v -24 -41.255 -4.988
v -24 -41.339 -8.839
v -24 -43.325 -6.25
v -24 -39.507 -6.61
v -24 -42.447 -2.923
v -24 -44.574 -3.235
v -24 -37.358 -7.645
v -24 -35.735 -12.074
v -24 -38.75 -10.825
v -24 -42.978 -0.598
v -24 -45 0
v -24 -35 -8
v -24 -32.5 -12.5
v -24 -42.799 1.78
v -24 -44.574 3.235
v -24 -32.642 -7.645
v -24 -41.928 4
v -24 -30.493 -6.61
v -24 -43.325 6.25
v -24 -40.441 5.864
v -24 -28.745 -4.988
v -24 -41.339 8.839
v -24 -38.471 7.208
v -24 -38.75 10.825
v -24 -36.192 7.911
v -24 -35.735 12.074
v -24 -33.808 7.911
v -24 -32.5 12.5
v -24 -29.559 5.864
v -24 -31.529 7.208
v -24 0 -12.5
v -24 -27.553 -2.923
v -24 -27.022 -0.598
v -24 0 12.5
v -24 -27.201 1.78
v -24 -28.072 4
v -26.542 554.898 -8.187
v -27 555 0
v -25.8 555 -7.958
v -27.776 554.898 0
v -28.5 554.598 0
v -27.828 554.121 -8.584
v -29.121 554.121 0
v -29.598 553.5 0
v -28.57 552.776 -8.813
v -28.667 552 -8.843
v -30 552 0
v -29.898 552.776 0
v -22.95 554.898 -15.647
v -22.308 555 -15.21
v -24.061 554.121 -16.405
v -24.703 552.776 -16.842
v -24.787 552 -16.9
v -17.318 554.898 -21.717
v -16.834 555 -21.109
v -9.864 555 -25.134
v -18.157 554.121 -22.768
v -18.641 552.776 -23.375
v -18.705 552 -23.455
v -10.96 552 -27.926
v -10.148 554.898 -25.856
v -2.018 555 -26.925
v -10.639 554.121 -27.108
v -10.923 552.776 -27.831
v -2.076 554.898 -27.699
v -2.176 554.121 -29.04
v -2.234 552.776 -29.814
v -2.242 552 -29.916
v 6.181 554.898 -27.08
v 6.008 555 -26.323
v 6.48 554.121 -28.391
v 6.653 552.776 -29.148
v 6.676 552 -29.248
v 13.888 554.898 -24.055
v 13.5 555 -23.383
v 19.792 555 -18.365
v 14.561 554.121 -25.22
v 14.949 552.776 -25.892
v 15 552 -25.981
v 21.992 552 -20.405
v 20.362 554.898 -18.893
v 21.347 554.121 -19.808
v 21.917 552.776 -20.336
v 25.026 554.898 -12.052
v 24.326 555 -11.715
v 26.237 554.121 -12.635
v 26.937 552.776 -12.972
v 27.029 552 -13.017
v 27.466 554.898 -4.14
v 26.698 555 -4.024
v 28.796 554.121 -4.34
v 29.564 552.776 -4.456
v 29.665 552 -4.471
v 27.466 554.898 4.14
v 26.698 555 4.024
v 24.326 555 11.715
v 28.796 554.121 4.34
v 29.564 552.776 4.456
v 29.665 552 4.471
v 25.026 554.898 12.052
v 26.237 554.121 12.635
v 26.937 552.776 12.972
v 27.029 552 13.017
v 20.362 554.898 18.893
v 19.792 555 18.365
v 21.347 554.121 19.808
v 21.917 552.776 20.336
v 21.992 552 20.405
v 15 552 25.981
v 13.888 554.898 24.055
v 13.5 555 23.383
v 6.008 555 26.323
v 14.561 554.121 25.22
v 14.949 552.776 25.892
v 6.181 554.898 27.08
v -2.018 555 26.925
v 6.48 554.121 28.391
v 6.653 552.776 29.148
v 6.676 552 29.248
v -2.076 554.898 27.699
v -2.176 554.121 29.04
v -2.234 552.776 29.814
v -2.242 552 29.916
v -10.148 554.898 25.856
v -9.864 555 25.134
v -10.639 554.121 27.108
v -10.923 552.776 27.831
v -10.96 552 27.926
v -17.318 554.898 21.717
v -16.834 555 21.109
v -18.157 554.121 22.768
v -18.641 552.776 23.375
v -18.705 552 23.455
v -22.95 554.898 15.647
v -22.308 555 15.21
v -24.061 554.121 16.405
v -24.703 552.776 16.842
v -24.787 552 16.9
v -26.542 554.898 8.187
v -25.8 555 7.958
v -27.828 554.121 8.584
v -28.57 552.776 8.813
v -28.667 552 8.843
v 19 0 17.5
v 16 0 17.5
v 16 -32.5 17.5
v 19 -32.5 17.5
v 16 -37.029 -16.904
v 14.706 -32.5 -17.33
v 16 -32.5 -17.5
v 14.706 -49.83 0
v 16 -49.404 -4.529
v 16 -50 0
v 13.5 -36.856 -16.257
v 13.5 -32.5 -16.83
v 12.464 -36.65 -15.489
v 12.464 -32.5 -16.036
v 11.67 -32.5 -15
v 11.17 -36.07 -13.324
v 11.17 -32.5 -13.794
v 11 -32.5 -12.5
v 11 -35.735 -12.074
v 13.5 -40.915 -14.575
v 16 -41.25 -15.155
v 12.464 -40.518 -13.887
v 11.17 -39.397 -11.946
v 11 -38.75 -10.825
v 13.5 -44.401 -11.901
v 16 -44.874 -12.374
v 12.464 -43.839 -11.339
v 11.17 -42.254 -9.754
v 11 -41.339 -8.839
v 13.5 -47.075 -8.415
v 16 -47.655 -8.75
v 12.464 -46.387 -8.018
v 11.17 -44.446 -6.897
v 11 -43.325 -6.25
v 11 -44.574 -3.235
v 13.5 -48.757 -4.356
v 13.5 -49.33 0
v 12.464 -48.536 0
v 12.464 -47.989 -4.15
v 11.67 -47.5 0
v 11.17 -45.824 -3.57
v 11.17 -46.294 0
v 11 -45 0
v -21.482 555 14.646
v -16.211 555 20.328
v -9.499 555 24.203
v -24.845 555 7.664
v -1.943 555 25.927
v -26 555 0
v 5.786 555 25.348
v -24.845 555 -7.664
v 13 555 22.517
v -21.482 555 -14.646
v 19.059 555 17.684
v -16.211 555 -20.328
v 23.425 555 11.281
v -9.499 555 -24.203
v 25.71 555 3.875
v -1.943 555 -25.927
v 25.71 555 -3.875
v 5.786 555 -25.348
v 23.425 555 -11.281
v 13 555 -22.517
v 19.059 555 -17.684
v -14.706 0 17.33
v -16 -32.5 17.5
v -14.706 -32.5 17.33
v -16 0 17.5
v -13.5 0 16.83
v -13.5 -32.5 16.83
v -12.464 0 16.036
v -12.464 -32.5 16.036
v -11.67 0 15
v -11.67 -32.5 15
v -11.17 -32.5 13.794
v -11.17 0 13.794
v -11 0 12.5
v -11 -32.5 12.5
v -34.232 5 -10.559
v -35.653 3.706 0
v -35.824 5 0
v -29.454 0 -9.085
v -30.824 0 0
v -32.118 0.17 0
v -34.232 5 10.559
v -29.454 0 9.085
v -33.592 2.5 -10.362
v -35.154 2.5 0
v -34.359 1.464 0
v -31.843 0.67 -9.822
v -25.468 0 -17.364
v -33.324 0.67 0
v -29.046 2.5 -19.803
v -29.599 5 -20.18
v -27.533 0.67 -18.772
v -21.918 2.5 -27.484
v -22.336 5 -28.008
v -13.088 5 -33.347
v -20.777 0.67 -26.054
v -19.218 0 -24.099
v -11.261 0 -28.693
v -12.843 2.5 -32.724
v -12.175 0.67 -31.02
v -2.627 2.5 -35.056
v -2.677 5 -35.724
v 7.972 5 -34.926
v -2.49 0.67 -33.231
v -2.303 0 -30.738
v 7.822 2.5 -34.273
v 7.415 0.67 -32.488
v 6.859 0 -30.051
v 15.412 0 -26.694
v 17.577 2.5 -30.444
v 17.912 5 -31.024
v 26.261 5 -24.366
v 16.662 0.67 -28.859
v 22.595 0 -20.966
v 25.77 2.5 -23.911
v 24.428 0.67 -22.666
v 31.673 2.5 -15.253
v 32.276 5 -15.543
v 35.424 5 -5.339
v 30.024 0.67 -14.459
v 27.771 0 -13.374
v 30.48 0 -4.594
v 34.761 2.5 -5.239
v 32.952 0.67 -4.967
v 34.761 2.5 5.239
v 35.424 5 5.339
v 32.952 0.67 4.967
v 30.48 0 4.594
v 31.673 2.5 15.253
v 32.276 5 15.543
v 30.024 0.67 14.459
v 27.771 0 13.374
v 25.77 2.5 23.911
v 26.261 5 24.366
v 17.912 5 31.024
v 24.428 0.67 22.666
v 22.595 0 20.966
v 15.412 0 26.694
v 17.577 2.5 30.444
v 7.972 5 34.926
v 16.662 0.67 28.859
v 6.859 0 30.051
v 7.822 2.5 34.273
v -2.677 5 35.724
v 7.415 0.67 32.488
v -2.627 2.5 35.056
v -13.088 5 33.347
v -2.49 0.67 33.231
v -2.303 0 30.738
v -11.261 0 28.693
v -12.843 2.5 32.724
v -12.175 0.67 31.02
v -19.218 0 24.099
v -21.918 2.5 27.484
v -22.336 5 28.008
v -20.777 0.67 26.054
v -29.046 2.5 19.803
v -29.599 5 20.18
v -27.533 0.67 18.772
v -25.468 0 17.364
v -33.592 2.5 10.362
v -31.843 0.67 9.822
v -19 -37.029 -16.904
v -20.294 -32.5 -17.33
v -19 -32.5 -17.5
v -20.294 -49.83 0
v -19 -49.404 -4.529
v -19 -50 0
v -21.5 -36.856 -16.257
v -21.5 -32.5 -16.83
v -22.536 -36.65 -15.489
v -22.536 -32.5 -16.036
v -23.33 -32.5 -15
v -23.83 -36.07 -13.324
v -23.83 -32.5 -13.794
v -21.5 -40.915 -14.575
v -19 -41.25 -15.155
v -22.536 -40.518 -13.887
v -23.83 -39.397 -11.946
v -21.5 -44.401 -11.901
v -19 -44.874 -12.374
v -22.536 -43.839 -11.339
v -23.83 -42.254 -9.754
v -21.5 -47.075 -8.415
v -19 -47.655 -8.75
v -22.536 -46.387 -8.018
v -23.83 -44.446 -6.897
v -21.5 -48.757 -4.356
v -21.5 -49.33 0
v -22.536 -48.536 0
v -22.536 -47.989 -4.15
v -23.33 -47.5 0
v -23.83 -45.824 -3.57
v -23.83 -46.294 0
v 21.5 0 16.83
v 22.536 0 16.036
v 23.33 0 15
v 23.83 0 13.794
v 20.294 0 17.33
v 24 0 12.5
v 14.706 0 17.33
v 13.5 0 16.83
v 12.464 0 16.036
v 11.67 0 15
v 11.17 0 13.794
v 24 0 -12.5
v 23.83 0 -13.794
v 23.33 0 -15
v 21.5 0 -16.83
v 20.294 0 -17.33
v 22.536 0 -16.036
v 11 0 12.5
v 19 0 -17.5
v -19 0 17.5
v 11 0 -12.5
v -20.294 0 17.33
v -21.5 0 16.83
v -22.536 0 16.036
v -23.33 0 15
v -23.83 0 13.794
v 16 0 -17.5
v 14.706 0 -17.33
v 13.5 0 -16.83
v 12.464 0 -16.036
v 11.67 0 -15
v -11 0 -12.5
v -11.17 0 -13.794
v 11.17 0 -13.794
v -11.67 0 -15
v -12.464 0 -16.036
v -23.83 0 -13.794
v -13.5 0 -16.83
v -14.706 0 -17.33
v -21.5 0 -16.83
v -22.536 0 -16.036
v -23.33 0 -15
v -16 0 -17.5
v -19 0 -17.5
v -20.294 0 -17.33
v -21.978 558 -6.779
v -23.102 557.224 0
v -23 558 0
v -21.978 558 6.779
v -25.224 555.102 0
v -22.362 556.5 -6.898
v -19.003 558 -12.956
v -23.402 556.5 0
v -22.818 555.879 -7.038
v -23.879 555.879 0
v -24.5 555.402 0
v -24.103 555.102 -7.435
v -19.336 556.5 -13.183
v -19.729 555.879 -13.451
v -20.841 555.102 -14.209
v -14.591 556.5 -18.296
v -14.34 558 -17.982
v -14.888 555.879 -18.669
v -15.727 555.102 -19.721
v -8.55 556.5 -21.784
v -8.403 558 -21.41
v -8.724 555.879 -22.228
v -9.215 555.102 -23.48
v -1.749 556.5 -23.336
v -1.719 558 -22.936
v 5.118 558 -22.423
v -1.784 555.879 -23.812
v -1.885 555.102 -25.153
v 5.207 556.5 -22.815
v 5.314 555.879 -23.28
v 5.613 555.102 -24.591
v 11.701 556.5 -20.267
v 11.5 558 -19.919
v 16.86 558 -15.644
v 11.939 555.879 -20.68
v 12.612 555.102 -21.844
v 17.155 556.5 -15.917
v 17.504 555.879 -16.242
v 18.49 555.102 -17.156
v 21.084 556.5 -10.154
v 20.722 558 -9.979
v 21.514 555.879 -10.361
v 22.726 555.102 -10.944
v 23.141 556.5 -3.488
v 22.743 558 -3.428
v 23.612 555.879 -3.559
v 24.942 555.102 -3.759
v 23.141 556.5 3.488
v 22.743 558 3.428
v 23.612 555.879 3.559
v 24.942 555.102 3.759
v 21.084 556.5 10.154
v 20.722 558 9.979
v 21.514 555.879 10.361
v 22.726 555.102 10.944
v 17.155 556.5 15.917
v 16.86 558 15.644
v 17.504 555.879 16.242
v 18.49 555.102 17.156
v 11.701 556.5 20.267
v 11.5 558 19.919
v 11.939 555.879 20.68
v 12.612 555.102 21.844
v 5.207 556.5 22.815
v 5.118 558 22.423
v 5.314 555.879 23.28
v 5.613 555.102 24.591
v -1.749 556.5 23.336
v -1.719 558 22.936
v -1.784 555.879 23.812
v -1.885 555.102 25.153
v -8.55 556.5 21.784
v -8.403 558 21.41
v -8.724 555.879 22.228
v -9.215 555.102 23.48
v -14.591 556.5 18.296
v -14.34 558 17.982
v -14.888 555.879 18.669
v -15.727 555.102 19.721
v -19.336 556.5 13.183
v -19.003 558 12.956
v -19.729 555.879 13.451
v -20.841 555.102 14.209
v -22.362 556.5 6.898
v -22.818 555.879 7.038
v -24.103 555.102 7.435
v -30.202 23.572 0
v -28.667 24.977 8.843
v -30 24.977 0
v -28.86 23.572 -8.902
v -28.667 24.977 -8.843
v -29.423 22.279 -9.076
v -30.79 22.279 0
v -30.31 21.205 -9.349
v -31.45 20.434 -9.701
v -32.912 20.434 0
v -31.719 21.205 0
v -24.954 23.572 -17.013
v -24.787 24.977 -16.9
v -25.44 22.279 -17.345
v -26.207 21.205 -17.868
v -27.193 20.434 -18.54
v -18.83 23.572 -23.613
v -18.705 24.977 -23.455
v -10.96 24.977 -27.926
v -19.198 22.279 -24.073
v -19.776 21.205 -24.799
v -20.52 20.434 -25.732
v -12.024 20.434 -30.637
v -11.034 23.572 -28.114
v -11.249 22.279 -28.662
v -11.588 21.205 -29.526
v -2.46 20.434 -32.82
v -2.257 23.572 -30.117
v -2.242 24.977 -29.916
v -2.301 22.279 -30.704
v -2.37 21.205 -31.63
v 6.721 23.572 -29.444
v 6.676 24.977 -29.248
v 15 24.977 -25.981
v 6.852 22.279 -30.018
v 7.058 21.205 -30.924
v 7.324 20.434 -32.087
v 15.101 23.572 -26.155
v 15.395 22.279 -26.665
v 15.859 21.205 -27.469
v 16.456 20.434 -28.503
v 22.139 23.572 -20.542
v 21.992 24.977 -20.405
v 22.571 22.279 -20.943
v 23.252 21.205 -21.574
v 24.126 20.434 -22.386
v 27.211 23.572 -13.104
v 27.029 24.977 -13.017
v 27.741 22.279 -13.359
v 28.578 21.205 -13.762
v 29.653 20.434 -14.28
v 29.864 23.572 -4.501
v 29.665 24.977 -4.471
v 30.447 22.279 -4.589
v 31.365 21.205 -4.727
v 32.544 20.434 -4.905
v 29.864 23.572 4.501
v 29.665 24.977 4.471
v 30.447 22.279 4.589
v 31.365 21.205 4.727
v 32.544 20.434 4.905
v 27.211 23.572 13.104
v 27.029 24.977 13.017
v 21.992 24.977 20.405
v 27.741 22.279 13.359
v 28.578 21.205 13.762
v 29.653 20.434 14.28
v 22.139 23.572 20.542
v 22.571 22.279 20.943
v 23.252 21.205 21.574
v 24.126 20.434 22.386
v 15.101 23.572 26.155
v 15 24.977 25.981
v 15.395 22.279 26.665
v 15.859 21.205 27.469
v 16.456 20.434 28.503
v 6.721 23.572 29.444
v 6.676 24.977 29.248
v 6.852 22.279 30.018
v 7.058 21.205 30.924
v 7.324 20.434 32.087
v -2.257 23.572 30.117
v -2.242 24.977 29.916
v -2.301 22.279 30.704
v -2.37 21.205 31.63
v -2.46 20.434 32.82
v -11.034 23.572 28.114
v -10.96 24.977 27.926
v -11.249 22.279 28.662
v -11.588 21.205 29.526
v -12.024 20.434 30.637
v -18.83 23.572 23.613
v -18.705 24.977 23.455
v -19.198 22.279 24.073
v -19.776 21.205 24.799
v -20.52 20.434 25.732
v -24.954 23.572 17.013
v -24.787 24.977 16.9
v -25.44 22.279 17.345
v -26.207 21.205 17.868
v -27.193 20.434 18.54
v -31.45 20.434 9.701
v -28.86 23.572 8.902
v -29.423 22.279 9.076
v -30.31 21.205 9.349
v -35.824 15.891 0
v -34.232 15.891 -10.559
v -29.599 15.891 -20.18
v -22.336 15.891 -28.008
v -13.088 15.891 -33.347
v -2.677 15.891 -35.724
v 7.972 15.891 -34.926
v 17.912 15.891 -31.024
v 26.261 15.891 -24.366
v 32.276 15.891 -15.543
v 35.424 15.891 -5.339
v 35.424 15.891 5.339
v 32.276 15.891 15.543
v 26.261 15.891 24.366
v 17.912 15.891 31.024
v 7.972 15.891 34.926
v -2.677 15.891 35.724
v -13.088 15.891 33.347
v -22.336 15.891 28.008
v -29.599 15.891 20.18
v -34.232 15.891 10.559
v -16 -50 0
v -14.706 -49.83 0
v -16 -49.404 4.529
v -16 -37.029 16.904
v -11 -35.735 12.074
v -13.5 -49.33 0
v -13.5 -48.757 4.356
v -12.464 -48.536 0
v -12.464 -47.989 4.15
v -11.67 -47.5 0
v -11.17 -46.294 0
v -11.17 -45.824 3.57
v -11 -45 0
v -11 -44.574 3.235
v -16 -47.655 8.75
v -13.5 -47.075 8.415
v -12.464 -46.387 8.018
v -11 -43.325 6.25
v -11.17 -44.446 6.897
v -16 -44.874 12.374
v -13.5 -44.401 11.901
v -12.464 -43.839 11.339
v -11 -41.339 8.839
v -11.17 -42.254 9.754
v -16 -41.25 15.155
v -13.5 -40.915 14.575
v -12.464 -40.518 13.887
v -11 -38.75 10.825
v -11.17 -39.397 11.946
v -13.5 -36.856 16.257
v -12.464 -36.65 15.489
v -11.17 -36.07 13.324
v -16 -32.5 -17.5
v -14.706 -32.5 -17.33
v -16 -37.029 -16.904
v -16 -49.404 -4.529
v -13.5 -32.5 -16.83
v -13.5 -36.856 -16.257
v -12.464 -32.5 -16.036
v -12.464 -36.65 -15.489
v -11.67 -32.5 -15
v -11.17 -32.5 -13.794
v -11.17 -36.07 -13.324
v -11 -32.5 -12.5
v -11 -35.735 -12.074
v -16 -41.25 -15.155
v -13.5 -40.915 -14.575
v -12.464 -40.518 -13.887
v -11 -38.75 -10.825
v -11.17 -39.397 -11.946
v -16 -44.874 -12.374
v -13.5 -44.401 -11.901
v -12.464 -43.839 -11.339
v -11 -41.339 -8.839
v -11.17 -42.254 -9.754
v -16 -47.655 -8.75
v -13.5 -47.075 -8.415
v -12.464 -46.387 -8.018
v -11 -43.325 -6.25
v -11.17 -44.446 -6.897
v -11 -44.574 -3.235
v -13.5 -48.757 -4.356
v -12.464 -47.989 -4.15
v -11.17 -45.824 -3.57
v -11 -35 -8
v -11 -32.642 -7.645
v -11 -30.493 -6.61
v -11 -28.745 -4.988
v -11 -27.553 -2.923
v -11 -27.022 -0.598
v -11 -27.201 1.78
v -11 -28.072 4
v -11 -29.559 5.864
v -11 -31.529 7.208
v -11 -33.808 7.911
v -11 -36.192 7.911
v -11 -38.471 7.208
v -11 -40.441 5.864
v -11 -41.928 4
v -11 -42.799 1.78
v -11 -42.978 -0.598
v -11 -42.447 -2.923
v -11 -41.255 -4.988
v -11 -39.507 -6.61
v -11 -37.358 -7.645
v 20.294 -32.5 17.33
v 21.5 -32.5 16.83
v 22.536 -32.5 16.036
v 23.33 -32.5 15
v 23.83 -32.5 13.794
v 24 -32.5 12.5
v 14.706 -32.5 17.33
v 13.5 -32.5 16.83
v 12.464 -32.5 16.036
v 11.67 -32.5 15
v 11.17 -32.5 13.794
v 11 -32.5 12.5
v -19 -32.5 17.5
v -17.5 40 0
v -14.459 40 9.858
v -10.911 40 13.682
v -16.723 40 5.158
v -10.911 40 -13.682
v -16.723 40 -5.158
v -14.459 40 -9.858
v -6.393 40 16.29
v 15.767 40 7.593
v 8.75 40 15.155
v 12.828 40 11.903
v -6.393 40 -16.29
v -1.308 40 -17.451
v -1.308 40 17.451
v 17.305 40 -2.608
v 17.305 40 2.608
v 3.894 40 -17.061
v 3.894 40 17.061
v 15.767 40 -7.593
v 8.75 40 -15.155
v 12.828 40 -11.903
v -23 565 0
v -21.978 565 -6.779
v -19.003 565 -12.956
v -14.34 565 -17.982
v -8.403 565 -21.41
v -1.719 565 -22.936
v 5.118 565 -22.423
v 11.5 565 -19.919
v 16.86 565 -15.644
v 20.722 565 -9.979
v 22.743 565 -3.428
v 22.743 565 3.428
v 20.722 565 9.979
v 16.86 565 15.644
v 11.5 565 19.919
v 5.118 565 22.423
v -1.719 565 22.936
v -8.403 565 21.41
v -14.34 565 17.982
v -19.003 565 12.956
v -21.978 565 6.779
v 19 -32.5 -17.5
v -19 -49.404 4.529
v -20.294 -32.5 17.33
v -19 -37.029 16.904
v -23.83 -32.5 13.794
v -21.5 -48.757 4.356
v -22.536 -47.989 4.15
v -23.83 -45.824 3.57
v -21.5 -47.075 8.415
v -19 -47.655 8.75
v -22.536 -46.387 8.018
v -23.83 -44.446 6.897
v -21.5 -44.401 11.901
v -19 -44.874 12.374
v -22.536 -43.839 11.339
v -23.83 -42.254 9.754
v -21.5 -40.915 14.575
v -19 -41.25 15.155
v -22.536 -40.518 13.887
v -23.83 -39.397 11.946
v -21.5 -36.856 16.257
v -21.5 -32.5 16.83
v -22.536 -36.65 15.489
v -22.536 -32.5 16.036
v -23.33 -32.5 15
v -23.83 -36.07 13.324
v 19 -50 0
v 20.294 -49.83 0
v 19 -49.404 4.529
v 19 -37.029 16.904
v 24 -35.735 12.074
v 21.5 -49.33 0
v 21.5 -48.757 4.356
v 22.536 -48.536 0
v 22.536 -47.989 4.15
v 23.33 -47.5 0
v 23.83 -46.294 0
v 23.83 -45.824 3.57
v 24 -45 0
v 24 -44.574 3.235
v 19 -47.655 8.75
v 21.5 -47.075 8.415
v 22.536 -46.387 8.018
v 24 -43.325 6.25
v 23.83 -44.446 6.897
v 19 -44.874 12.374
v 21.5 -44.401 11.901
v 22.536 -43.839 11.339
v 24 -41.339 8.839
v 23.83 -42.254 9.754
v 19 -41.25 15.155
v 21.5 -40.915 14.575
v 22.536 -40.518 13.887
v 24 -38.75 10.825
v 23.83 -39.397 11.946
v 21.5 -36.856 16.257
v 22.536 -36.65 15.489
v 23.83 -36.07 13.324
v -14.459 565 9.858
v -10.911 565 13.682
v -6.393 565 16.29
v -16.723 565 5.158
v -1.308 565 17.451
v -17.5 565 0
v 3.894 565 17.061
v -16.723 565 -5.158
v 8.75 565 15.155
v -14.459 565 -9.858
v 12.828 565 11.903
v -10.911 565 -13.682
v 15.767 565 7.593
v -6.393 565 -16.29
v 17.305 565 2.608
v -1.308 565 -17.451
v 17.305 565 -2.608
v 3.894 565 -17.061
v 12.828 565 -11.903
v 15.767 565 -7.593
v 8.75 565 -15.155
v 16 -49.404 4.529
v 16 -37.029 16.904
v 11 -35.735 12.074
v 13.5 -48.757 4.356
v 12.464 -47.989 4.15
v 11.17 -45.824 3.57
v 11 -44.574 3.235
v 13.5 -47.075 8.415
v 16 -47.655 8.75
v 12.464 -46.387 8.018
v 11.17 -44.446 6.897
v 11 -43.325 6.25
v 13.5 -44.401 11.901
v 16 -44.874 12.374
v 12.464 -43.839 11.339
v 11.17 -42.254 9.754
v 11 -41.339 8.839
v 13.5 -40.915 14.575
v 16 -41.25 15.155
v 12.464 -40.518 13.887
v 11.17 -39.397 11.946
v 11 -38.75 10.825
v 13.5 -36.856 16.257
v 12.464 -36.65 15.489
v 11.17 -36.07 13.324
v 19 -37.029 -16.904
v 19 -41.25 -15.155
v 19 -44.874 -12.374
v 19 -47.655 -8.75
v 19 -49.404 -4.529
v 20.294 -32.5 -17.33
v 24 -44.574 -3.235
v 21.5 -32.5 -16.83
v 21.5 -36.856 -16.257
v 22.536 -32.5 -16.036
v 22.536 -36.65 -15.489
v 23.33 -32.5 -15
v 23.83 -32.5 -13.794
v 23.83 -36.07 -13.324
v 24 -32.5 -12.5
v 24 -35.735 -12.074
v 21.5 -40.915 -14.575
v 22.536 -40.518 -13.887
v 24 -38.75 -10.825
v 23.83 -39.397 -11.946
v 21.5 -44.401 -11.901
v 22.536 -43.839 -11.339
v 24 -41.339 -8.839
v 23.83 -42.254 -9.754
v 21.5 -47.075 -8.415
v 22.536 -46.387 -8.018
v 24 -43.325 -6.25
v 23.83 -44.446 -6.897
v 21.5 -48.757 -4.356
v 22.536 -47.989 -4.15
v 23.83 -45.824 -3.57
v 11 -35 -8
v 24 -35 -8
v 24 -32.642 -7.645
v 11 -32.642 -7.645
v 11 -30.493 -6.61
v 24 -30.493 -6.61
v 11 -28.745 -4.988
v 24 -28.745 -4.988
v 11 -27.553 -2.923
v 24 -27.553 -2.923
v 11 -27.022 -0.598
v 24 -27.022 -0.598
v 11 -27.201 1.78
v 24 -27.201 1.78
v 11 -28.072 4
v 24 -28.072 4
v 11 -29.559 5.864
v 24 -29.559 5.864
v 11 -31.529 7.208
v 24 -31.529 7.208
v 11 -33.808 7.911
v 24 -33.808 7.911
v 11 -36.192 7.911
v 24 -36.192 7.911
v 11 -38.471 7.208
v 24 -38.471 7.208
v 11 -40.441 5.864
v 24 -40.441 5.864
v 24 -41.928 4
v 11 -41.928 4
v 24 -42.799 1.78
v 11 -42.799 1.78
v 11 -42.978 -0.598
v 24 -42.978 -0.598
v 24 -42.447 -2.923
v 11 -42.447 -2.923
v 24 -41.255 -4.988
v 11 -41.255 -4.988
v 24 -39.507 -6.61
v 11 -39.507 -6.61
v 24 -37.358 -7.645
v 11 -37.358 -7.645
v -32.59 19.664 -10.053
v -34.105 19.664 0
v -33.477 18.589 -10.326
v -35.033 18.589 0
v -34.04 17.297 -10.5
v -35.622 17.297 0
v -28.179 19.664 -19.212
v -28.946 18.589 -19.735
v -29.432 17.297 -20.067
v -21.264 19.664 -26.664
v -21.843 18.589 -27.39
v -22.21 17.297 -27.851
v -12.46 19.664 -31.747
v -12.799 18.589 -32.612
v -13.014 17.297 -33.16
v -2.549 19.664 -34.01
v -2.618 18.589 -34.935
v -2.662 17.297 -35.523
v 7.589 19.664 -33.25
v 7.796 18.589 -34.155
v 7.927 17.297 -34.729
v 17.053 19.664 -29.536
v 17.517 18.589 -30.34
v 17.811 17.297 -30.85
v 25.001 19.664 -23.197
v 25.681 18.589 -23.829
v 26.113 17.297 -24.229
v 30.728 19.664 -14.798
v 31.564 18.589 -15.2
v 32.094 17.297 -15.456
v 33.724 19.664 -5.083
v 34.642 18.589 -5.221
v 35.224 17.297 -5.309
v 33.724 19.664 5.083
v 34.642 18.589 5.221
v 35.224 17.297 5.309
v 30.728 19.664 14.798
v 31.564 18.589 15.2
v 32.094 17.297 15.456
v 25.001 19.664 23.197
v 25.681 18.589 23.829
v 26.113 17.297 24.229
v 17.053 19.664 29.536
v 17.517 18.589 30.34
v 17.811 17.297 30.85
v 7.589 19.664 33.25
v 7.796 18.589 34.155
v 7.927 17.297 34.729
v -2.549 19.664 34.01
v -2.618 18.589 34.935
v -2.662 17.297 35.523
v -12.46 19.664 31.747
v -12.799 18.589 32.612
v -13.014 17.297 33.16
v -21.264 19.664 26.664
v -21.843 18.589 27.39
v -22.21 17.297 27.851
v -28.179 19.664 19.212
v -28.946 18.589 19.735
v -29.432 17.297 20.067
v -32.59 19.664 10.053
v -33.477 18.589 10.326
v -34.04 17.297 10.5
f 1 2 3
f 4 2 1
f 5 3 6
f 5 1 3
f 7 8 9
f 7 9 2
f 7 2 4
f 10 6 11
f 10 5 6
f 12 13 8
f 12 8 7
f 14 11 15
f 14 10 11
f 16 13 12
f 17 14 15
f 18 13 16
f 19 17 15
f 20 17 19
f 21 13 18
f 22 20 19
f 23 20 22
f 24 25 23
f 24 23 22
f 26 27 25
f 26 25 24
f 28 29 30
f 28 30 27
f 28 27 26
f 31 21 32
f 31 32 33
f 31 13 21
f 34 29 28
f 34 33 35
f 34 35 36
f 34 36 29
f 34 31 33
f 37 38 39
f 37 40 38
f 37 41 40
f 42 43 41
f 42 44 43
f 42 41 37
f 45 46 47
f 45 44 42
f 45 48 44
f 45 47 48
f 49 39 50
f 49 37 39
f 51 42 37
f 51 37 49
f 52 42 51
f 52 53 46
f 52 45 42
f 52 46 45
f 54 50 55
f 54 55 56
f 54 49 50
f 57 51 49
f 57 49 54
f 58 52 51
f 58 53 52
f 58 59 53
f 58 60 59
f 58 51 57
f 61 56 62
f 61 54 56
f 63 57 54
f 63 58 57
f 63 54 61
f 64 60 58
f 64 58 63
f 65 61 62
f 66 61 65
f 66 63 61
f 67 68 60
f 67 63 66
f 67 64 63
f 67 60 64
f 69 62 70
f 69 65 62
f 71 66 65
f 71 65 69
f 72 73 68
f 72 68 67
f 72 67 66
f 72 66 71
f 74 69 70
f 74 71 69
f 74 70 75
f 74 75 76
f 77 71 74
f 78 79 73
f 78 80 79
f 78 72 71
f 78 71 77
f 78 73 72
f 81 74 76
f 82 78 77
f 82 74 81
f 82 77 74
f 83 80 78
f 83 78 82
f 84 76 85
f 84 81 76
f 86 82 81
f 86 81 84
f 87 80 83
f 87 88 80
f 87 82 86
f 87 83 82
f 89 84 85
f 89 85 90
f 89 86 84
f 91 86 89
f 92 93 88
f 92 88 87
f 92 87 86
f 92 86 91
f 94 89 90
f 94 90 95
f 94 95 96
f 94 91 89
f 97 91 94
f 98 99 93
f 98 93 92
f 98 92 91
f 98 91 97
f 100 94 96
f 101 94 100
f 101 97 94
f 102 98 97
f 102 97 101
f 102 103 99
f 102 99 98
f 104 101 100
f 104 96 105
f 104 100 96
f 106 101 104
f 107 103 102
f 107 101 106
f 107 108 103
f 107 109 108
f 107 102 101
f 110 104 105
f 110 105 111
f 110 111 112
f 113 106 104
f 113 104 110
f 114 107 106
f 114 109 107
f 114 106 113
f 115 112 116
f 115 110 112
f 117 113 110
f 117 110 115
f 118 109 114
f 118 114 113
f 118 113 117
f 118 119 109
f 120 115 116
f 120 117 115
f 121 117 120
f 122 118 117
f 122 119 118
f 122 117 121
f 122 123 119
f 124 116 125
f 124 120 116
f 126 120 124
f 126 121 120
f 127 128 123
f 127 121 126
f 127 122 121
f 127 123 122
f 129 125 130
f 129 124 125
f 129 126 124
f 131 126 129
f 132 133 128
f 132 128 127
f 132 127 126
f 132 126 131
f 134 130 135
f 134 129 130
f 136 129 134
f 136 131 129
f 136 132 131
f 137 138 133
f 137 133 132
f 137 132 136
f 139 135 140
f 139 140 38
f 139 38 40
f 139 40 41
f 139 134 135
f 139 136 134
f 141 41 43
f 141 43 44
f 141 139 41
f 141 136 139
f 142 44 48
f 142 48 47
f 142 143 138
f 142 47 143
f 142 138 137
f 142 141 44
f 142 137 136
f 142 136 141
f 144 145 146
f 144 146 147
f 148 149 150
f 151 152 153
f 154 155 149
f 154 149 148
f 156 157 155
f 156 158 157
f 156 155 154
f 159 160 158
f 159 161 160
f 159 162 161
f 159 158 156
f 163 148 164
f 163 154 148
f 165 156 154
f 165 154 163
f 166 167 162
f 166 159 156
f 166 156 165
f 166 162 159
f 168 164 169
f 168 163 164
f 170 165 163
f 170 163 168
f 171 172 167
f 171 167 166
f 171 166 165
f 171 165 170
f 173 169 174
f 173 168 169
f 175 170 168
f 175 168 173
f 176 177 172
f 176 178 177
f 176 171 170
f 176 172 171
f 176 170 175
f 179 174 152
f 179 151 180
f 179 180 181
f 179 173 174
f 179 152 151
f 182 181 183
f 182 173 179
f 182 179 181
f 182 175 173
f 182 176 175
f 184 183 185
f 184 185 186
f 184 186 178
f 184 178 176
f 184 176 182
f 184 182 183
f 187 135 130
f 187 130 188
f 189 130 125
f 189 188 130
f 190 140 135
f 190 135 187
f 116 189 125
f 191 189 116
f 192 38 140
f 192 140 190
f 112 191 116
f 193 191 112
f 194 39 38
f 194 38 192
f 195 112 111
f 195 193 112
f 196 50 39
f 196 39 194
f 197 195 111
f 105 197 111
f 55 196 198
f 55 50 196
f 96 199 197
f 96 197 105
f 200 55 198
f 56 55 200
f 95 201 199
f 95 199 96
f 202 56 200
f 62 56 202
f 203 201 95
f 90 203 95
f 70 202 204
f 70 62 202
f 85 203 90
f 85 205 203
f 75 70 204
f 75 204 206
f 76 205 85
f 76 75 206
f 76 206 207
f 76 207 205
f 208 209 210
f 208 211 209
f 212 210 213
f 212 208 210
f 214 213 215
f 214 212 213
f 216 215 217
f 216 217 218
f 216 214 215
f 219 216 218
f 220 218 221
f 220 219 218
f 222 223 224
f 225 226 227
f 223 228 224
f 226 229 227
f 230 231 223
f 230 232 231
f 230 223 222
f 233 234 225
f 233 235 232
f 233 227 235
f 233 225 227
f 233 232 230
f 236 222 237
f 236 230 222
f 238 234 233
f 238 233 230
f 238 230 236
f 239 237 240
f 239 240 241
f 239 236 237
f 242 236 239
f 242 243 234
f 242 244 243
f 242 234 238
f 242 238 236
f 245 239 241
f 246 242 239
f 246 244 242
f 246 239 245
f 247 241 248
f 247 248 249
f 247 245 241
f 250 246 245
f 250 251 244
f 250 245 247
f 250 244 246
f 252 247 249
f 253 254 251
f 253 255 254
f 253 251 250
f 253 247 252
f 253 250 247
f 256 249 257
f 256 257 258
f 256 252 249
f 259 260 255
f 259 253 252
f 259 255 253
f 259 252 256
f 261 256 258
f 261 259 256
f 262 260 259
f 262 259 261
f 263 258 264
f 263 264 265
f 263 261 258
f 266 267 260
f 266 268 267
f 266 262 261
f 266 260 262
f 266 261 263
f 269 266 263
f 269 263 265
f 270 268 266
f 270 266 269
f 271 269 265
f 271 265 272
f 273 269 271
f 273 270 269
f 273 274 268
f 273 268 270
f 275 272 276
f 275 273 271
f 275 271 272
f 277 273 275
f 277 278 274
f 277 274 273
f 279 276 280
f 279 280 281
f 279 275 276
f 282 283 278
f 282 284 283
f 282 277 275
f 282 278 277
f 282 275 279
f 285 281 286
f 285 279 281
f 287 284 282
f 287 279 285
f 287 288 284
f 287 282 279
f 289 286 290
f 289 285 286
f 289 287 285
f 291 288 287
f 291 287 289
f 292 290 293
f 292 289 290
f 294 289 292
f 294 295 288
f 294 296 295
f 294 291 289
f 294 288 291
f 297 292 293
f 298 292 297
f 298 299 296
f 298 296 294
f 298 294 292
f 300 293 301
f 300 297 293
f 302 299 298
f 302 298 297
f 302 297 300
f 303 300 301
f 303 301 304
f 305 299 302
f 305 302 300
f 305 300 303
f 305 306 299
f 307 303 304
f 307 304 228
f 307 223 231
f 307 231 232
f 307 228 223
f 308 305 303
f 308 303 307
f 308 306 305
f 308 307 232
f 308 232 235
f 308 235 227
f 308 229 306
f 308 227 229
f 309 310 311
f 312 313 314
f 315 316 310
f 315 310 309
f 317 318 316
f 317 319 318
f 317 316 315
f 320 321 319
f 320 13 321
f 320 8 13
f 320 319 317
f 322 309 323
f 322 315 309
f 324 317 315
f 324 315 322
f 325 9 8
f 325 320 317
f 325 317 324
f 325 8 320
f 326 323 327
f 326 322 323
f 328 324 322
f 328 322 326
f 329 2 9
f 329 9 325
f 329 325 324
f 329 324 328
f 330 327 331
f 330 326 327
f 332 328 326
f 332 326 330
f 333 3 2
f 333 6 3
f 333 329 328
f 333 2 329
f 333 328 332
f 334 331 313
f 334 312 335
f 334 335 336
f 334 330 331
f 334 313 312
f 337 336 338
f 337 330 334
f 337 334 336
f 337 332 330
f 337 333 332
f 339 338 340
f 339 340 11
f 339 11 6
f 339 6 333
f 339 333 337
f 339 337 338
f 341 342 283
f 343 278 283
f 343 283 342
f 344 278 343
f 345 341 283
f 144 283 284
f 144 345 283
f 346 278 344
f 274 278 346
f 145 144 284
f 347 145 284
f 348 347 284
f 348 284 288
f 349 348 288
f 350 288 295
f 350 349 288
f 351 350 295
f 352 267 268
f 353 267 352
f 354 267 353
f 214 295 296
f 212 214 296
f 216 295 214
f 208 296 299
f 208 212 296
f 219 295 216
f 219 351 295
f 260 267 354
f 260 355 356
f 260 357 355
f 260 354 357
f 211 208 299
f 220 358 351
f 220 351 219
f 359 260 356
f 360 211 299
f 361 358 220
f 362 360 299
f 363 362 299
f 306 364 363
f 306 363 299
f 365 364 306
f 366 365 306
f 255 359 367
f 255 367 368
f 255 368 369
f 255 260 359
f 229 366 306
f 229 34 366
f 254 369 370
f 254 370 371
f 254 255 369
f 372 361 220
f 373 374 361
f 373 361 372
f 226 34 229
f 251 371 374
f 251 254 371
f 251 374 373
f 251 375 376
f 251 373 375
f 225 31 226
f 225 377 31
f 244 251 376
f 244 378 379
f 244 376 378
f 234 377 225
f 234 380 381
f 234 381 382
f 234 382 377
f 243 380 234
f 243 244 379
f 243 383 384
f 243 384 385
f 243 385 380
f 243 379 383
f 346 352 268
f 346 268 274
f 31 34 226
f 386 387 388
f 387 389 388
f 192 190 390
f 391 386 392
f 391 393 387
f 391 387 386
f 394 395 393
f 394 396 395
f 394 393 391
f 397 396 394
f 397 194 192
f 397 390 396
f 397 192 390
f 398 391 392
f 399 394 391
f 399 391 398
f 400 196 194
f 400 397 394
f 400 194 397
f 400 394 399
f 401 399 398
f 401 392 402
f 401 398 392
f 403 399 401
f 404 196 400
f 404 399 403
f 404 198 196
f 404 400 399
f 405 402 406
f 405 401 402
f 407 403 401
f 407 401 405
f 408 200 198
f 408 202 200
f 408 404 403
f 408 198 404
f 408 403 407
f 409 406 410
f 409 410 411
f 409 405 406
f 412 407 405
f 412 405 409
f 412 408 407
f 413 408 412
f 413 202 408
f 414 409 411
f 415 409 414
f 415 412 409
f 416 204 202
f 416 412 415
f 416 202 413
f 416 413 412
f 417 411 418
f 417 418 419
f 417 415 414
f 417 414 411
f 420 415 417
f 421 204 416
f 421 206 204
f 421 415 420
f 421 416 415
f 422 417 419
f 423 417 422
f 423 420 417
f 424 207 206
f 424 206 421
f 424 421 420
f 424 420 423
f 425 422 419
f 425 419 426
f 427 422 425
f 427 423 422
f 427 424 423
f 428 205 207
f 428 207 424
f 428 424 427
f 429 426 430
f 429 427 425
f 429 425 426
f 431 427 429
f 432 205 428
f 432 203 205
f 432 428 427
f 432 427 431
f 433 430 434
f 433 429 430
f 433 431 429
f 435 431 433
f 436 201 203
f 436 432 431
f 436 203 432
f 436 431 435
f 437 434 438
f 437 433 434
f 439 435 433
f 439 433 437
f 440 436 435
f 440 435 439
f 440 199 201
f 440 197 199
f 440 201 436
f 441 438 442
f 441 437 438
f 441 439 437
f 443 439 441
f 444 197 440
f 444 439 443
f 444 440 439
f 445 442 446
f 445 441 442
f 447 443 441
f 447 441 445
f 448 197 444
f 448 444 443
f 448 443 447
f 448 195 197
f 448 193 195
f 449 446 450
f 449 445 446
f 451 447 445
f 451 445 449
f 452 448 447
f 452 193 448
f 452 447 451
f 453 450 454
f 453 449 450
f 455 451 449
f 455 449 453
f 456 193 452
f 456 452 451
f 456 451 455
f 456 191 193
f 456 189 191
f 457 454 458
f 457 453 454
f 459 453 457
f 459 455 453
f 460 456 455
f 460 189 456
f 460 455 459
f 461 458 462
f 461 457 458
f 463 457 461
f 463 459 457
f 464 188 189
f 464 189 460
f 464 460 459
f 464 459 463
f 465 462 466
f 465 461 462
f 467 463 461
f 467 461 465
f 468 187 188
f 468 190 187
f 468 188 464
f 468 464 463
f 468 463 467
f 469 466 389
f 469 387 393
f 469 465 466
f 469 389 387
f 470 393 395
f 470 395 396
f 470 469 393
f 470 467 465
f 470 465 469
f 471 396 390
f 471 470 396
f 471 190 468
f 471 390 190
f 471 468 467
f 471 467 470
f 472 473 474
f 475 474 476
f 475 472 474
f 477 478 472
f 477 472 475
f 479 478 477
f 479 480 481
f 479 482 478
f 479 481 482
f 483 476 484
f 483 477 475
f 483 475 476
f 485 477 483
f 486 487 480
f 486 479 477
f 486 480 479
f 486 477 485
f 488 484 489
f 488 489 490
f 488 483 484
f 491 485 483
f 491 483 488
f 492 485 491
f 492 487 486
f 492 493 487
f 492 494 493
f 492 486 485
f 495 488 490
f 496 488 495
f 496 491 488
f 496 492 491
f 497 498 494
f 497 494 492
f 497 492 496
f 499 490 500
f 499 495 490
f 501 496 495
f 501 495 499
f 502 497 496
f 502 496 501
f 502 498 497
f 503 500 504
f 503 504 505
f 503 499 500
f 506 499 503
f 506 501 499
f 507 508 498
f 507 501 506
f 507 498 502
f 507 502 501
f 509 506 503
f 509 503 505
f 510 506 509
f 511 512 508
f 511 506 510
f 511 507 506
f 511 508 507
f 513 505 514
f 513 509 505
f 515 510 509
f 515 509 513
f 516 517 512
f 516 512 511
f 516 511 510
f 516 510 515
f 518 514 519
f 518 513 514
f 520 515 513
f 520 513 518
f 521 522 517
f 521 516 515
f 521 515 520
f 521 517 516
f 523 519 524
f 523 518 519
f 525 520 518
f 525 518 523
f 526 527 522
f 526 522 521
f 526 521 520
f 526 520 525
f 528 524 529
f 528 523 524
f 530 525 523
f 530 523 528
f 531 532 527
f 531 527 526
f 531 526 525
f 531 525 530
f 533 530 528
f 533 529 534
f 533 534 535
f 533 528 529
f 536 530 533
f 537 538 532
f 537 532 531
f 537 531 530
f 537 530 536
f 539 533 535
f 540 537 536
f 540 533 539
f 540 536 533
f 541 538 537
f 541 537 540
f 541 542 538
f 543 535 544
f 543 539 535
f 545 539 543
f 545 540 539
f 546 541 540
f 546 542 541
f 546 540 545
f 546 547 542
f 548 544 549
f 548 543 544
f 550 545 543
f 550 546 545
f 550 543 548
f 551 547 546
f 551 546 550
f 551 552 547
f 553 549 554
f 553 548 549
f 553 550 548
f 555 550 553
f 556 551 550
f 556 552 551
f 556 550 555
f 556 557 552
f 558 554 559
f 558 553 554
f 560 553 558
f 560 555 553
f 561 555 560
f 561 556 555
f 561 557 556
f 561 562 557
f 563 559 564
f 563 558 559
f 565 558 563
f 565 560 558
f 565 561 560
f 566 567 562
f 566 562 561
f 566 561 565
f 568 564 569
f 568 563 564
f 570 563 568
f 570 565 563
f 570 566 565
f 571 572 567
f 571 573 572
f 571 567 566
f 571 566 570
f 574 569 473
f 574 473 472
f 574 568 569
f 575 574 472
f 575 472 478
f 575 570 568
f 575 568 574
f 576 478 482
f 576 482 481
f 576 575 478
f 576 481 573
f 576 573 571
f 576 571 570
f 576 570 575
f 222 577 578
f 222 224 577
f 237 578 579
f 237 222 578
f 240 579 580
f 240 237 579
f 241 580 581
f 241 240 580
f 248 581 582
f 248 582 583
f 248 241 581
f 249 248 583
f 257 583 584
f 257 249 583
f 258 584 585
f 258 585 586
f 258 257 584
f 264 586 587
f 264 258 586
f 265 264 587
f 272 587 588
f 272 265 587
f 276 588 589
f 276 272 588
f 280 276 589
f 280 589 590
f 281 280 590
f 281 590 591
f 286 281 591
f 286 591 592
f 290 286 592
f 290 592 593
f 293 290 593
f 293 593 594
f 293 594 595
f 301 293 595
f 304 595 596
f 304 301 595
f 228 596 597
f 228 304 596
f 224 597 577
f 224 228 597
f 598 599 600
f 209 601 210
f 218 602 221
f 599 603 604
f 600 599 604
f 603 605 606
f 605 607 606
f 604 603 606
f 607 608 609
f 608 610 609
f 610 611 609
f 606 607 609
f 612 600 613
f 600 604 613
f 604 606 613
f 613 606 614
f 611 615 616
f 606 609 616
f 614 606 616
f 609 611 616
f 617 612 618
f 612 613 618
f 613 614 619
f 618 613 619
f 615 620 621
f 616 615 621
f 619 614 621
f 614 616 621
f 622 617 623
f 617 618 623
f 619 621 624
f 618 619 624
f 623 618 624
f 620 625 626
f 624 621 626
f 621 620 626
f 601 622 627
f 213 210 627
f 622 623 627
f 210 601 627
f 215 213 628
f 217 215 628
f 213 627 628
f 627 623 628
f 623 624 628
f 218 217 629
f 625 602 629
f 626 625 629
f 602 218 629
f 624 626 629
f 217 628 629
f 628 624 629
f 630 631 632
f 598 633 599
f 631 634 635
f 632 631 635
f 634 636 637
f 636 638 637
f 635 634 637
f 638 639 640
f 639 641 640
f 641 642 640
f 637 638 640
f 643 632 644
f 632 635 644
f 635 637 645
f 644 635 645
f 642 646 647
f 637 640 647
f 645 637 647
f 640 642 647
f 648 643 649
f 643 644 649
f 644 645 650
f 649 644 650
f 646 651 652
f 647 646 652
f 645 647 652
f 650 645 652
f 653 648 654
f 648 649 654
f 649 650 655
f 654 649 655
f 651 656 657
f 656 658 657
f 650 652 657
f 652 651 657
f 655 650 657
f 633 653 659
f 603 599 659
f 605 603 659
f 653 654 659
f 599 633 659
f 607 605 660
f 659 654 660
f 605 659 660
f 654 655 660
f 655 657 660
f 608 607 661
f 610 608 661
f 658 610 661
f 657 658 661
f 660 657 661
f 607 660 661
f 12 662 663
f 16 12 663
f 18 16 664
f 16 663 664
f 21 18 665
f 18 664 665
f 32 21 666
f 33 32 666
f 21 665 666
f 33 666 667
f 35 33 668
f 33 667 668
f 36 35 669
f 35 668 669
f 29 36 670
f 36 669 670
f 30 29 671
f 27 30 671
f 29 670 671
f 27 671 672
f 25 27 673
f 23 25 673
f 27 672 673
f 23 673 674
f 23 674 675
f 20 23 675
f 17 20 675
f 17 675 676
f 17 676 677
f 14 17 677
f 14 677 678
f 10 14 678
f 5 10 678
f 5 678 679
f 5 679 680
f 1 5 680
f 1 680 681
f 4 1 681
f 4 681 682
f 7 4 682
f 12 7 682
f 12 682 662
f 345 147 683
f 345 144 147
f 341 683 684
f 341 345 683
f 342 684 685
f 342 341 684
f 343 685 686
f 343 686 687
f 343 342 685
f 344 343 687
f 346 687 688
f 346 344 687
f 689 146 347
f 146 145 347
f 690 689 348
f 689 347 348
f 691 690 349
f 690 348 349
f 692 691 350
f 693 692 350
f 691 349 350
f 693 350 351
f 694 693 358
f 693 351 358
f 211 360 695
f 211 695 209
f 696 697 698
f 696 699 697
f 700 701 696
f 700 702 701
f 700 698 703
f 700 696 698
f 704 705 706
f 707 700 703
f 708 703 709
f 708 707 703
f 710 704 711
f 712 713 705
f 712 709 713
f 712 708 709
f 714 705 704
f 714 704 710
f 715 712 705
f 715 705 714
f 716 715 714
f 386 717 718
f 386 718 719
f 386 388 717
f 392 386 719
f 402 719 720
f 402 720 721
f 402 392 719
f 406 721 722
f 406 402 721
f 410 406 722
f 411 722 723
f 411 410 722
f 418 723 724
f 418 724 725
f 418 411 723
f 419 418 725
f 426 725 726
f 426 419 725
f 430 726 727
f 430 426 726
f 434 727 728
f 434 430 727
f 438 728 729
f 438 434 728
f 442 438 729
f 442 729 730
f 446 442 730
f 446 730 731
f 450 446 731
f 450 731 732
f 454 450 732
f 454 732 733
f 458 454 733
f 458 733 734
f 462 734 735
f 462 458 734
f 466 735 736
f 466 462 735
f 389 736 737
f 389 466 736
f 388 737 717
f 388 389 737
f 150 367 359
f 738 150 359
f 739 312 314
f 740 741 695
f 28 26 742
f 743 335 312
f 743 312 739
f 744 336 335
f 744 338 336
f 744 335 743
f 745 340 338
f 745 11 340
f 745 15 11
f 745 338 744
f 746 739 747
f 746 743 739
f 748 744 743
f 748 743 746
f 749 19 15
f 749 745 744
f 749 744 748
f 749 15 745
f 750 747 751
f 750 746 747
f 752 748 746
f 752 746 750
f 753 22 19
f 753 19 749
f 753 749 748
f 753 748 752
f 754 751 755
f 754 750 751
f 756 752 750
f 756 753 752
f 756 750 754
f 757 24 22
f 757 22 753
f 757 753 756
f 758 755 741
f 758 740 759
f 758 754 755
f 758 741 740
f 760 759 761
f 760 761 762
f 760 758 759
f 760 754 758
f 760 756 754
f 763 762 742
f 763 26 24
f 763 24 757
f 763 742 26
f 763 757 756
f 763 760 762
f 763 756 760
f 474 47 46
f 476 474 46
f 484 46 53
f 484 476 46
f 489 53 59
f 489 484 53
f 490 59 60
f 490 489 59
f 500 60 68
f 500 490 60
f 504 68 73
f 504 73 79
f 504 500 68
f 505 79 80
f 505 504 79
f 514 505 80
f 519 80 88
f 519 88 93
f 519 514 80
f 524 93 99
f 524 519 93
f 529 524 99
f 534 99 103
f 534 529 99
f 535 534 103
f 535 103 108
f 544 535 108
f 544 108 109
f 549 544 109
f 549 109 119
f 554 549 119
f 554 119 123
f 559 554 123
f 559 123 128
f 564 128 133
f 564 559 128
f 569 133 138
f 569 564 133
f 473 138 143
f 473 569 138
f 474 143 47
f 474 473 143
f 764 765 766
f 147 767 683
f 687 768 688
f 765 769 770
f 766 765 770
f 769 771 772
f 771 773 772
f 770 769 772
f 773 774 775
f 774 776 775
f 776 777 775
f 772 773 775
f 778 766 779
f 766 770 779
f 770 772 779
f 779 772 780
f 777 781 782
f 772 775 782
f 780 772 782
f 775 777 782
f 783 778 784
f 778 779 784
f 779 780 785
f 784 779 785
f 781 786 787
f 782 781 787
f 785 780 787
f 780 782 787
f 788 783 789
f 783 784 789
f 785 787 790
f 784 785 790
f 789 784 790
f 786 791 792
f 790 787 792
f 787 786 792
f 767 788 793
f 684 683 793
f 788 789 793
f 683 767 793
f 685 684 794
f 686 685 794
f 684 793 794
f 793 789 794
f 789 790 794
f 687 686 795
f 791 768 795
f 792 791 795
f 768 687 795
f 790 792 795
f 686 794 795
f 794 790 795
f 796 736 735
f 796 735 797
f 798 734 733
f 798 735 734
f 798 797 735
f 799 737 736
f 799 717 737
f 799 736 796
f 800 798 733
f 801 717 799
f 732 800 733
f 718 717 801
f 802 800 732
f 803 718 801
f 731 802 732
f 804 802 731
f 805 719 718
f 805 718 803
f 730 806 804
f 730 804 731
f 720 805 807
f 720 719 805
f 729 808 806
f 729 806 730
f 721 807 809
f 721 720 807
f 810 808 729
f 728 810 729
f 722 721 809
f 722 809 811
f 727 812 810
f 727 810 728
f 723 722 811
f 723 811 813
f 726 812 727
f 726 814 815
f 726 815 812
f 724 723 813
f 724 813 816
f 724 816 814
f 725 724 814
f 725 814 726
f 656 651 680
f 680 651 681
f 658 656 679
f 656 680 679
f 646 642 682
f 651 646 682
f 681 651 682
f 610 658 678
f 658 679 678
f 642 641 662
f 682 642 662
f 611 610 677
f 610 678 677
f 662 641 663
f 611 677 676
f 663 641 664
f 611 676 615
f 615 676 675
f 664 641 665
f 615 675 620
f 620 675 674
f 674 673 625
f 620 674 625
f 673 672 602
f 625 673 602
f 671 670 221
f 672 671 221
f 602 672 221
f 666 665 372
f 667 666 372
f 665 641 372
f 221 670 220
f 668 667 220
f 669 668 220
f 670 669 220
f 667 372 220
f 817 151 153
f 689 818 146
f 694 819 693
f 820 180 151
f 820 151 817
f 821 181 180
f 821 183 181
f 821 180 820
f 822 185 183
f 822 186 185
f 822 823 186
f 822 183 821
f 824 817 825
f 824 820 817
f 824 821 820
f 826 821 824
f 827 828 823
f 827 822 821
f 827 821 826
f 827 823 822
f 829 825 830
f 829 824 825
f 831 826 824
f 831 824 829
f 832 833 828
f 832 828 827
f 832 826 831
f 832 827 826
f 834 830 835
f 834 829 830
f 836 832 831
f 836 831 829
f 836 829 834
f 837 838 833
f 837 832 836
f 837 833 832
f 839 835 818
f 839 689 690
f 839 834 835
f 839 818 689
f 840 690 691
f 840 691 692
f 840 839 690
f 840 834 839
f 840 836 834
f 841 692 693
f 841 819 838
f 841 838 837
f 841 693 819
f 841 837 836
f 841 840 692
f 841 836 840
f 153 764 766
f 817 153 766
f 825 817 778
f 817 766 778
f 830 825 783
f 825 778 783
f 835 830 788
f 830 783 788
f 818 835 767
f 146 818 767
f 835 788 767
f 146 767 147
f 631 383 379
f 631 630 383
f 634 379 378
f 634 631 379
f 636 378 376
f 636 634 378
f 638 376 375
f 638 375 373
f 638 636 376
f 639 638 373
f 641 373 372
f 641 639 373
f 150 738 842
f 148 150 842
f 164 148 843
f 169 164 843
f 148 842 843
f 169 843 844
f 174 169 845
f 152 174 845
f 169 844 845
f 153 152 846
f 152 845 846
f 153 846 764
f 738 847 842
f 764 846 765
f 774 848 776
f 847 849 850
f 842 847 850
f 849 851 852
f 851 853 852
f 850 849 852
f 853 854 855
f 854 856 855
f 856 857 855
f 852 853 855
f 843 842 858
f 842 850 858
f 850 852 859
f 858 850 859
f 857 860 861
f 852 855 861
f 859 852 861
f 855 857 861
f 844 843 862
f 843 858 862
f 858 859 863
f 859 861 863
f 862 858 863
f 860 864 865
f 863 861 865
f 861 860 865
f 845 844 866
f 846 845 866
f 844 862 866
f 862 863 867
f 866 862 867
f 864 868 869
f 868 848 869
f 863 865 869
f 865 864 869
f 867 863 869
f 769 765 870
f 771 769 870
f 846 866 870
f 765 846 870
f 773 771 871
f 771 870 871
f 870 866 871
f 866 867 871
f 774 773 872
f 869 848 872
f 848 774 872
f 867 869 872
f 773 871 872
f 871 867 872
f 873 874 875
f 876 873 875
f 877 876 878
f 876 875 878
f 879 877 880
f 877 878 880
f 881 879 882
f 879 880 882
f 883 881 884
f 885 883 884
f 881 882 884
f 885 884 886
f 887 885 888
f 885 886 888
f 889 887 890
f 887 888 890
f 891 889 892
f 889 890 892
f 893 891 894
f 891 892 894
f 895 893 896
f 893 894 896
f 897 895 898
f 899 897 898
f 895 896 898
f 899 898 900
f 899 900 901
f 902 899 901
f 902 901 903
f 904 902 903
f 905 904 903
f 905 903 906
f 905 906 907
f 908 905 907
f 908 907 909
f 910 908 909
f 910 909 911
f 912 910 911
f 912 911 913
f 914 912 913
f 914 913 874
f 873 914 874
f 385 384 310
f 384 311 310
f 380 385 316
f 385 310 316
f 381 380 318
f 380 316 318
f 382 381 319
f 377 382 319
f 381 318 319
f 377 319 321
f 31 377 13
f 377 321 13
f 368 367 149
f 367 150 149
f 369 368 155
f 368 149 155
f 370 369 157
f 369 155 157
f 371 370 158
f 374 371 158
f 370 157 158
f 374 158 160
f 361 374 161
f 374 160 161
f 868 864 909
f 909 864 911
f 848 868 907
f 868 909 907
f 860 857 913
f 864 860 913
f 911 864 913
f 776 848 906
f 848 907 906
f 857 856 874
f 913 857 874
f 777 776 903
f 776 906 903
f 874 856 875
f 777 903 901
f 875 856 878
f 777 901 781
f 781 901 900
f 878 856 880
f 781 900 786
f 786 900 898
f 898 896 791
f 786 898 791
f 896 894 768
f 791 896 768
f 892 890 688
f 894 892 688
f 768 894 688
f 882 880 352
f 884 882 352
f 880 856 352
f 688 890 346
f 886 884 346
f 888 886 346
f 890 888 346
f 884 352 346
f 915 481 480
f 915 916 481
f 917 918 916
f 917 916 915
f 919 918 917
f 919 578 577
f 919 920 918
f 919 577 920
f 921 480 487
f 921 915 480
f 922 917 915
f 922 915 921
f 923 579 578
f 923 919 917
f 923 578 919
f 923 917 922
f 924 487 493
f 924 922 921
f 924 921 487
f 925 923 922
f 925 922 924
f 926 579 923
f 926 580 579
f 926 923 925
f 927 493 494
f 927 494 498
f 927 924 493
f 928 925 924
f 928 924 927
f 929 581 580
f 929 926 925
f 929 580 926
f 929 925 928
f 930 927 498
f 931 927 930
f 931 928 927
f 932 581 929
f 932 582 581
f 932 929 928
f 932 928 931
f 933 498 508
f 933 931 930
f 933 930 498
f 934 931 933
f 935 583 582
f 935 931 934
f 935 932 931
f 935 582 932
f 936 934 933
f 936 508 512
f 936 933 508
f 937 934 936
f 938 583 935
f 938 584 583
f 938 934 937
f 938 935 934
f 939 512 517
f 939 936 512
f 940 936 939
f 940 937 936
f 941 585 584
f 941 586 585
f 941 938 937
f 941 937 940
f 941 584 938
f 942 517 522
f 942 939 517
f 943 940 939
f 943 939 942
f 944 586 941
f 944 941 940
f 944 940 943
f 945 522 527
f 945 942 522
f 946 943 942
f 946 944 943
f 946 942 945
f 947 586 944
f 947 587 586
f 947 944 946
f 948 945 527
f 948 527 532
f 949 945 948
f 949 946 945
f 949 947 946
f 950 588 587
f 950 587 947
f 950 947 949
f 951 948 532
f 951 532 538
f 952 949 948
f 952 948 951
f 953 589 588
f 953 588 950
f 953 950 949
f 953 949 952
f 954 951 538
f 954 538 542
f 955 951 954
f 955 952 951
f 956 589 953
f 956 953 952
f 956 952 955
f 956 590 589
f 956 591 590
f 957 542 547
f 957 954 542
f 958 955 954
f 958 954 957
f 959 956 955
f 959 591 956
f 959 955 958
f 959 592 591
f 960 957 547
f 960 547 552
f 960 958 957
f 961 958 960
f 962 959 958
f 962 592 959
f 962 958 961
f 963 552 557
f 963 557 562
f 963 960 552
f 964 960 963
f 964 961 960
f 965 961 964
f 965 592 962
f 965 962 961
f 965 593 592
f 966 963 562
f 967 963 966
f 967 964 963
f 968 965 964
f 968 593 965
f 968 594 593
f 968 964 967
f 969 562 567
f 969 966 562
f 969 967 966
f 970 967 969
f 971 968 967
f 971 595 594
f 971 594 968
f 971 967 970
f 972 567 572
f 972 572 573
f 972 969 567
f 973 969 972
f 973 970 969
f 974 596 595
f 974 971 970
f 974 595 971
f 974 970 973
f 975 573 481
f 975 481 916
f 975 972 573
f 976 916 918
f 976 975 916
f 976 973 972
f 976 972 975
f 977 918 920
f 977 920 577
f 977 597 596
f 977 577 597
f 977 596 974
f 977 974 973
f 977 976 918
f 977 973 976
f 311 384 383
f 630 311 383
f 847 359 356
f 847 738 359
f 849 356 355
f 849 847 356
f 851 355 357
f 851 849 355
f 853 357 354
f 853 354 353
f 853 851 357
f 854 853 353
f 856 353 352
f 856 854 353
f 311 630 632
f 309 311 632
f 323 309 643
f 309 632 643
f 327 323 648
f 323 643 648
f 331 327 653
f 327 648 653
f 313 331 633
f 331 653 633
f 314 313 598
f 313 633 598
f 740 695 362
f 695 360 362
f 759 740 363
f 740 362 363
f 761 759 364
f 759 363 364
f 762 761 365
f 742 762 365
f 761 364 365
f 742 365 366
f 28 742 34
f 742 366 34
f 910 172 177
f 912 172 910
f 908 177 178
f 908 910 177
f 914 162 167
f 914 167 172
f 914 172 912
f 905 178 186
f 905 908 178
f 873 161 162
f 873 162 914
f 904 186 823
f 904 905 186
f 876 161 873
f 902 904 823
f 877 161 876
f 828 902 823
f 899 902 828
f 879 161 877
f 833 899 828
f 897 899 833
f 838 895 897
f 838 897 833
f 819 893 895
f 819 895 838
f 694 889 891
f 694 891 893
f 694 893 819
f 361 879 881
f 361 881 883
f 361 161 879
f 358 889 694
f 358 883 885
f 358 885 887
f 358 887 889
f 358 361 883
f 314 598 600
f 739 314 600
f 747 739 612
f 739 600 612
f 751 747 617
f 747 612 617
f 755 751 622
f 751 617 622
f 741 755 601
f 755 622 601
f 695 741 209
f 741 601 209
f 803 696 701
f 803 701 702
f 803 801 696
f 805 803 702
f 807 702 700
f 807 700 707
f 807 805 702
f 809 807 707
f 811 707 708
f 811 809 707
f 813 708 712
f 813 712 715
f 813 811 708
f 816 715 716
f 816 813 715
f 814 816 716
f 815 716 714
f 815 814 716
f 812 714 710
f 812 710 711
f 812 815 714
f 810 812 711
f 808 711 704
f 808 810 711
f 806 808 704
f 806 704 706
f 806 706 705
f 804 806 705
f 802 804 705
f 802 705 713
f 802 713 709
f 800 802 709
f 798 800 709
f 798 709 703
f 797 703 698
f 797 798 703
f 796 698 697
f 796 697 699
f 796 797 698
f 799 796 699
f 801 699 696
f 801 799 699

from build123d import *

# Parameters (mm, degrees)
SKETCH2_W           = 13
SKETCH2_H           = 35
BOSS_EXTRUDE1_DEPTH = 50
SKETCH3_R           = 8
CUT_EXTRUDE1_DEPTH  = 60.823854569
FILLET1_R           = 5


with BuildPart() as part:
    # Sketch1 → Revolve1 (revolve)
    with BuildSketch(Plane.XY):
        with BuildLine():
            Line((-30, 552), (-30, 24.977358367))
            ThreePointArc((-30, 24.977358367), (-30.790465371, 22.279244542), (-32.911927285, 20.434236936))
            ThreePointArc((-32.911927285, 20.434236936), (-35.033389198, 18.58922933), (-35.823854569, 15.891115505))
            Line((-35.823854569, 15.891115505), (-35.823854569, 5))
            ThreePointArc((-35.823854569, 5), (-34.359388475, 1.464466094), (-30.823854569, 0))
            Line((-30.823854569, 0), (0, 0))
            Line((0, 0), (0, 40))
            Line((0, 40), (-17.5, 40))
            Line((-17.5, 40), (-17.5, 565))
            Line((-17.5, 565), (-23, 565))
            Line((-23, 565), (-23, 558))
            ThreePointArc((-23, 558), (-23.878679656, 555.878679656), (-26, 555))
            Line((-26, 555), (-27, 555))
            ThreePointArc((-27, 555), (-29.121320344, 554.121320344), (-30, 552))
        make_face()
    revolve(axis=Axis((0, 40, 0), (0, -1, 0)))

    # Sketch2 → Boss-Extrude1 (add)
    with BuildSketch(Plane.XZ):
        with Locations((17.5, 0)):
            Rectangle(SKETCH2_W, SKETCH2_H)
        with Locations((-17.5, 0)):
            Rectangle(SKETCH2_W, SKETCH2_H)
    extrude(amount=BOSS_EXTRUDE1_DEPTH)

    # Sketch3 → Cut-Extrude1 (cut, through all)
    with BuildSketch(Plane(origin=(24, 0, 0), x_dir=(0, 0, -1), z_dir=(1, 0, 0))):
        with BuildLine():
            ThreePointArc((0, -50), (-12.374368671, -44.874368671), (-17.5, -32.5))
            Line((-17.5, -32.5), (-17.5, -50))
            Line((-17.5, -50), (0, -50))
        make_face()
        with BuildLine():
            ThreePointArc((17.5, -32.5), (12.374368671, -44.874368671), (0, -50))
            Line((0, -50), (17.5, -50))
            Line((17.5, -50), (17.5, -32.5))
        make_face()
        with Locations((0, -35)):
            Circle(SKETCH3_R)
    extrude(amount=-CUT_EXTRUDE1_DEPTH, mode=Mode.SUBTRACT)

    # Fillet1
    fillet1_edges = [part.edges().sort_by_distance(p)[0] for p in [
        (-11, -16.25, -17.5),
        (-24, -16.25, -17.5),
        (24, -16.25, -17.5),
        (11, -16.25, -17.5),
        (24, -50, 0),
        (11, -50, 0),
        (-11, -50, 0),
        (-24, -50, 0),
        (-24, -16.25, 17.5),
        (-11, -16.25, 17.5),
        (11, -16.25, 17.5),
        (24, -16.25, 17.5),
    ]]
    fillet(fillet1_edges, radius=FILLET1_R)


solid = part.part
